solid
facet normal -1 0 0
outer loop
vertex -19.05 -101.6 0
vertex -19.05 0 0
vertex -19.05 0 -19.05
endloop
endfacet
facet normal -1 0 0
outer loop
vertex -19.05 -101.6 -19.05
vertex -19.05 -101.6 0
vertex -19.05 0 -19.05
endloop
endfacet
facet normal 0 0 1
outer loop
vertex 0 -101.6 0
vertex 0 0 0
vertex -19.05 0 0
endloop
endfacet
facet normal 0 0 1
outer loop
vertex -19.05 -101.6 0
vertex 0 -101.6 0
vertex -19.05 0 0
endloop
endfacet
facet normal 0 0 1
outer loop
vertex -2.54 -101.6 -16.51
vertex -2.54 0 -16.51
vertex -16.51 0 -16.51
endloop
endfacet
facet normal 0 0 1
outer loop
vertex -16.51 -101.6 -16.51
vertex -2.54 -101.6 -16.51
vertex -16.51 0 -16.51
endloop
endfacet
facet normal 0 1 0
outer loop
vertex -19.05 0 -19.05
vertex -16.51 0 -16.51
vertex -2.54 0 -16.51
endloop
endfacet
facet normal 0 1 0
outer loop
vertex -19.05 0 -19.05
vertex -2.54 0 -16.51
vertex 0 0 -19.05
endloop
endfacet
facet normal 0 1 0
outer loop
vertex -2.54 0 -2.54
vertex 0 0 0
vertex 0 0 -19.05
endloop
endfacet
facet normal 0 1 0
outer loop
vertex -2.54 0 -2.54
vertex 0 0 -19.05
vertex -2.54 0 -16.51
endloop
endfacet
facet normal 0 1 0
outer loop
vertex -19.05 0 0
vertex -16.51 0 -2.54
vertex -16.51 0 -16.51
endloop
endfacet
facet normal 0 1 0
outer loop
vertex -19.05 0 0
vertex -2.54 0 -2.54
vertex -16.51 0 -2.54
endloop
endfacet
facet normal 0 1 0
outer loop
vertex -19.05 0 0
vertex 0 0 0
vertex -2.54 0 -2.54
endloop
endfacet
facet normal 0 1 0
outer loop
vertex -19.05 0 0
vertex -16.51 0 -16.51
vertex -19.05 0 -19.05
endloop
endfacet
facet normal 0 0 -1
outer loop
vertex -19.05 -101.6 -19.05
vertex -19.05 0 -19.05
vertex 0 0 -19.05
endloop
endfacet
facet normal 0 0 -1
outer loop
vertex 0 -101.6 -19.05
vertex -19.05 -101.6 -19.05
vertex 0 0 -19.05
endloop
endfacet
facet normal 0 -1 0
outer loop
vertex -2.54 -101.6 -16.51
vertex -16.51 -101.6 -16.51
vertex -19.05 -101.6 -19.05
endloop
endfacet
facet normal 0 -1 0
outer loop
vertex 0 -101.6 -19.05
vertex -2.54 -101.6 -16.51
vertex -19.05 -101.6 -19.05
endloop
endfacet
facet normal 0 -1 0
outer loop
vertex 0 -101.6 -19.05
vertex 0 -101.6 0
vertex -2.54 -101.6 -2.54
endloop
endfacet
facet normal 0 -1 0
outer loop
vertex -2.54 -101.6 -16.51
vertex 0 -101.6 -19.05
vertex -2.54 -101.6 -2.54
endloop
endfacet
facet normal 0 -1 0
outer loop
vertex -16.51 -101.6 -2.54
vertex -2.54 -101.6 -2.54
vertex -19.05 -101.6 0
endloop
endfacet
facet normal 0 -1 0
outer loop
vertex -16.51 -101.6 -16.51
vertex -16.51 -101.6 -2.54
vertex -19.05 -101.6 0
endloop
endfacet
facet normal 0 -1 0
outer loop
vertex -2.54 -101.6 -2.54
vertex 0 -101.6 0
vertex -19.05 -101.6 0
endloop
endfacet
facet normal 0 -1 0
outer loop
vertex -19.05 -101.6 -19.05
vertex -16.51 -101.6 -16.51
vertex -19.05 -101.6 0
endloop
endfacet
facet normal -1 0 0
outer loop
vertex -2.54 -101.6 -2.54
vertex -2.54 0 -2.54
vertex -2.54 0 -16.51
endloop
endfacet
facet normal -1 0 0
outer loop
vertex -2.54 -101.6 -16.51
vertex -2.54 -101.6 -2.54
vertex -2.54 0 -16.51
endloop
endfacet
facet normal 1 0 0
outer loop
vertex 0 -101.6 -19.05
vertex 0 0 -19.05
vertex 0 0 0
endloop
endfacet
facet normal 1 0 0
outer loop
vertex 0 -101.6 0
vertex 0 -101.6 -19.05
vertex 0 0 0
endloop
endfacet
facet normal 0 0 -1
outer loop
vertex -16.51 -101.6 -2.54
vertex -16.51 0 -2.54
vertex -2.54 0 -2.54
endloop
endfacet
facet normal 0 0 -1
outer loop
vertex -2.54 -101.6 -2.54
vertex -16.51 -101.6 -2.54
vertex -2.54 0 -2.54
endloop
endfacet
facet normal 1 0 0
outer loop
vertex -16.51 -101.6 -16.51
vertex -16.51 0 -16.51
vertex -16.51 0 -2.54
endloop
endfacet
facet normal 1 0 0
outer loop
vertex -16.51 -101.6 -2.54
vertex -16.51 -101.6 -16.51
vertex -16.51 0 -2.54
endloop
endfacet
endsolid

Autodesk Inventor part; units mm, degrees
ref_plane "YZ Plane" through (0, 0, 0) normal (1, 0, 0) x (0, 1, 0)
ref_plane "XZ Plane" through (0, 0, 0) normal (0, 1, 0) x (-1, 0, 0)
ref_plane "XY Plane" through (0, 0, 0) normal (0, 0, 1) x (1, 0, 0)
sketch "Sketch1" plane through (0, 0, 0) normal (0, 1, 0) x (-1, 0, 0)
  line L0 (0, 0) -> (19.05, 0)
  line L1 (19.05, 0) -> (19.05, -19.05)
  line L2 (19.05, -19.05) -> (0, -19.05)
  line L3 (0, -19.05) -> (0, 0)
  line L4 (16.51, -16.51) -> (16.51, -2.54)
  line L5 (16.51, -2.54) -> (2.54, -2.54)
  line L6 (2.54, -2.54) -> (2.54, -16.51)
  line L7 (2.54, -16.51) -> (16.51, -16.51)
  dimension "d0" = 19.05
  dimension "d1" = 19.05
  dimension "d2" = 2.54
extrude "Extrusion1" add sketch "Sketch1" against normal blind 101.6
properties part number "Aluminum channel2"
